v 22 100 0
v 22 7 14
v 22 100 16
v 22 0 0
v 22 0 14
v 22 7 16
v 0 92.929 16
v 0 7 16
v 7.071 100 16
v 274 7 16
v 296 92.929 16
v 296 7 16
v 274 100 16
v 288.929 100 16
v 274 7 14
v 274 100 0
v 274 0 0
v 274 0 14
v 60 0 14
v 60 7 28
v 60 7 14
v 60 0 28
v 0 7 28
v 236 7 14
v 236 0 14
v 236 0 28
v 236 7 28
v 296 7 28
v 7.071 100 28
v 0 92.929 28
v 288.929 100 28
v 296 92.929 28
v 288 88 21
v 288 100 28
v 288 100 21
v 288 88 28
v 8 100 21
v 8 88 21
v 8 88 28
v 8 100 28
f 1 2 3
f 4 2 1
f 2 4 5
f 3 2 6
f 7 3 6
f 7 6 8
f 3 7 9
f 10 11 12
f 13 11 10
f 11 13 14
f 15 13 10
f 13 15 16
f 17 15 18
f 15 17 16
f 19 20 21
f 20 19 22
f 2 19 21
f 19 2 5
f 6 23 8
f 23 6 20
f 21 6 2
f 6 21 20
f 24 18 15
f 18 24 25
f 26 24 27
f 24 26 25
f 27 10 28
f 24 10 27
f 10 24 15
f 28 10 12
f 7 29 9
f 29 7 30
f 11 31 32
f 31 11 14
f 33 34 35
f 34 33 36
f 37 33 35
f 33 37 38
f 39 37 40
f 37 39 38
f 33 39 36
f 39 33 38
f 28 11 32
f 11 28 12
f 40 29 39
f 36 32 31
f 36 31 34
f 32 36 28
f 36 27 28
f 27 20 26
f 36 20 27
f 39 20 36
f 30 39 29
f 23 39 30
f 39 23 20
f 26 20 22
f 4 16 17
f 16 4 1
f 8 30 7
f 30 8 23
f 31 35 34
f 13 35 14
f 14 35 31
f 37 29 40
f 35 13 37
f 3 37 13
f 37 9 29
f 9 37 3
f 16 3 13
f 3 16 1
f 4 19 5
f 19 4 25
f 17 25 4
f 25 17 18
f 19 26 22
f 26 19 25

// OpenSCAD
include <../src/wardrobe.scad>;
plank_yx_side_bottom();
//github_openscad -o wardrobe_3/plank_yx_side_bottom.stl -D wardrobe_n=3 -D cutting_edge=0 -D break_view_length=0 wardrobe_3/plank_yx_side_bottom_stl.scad
